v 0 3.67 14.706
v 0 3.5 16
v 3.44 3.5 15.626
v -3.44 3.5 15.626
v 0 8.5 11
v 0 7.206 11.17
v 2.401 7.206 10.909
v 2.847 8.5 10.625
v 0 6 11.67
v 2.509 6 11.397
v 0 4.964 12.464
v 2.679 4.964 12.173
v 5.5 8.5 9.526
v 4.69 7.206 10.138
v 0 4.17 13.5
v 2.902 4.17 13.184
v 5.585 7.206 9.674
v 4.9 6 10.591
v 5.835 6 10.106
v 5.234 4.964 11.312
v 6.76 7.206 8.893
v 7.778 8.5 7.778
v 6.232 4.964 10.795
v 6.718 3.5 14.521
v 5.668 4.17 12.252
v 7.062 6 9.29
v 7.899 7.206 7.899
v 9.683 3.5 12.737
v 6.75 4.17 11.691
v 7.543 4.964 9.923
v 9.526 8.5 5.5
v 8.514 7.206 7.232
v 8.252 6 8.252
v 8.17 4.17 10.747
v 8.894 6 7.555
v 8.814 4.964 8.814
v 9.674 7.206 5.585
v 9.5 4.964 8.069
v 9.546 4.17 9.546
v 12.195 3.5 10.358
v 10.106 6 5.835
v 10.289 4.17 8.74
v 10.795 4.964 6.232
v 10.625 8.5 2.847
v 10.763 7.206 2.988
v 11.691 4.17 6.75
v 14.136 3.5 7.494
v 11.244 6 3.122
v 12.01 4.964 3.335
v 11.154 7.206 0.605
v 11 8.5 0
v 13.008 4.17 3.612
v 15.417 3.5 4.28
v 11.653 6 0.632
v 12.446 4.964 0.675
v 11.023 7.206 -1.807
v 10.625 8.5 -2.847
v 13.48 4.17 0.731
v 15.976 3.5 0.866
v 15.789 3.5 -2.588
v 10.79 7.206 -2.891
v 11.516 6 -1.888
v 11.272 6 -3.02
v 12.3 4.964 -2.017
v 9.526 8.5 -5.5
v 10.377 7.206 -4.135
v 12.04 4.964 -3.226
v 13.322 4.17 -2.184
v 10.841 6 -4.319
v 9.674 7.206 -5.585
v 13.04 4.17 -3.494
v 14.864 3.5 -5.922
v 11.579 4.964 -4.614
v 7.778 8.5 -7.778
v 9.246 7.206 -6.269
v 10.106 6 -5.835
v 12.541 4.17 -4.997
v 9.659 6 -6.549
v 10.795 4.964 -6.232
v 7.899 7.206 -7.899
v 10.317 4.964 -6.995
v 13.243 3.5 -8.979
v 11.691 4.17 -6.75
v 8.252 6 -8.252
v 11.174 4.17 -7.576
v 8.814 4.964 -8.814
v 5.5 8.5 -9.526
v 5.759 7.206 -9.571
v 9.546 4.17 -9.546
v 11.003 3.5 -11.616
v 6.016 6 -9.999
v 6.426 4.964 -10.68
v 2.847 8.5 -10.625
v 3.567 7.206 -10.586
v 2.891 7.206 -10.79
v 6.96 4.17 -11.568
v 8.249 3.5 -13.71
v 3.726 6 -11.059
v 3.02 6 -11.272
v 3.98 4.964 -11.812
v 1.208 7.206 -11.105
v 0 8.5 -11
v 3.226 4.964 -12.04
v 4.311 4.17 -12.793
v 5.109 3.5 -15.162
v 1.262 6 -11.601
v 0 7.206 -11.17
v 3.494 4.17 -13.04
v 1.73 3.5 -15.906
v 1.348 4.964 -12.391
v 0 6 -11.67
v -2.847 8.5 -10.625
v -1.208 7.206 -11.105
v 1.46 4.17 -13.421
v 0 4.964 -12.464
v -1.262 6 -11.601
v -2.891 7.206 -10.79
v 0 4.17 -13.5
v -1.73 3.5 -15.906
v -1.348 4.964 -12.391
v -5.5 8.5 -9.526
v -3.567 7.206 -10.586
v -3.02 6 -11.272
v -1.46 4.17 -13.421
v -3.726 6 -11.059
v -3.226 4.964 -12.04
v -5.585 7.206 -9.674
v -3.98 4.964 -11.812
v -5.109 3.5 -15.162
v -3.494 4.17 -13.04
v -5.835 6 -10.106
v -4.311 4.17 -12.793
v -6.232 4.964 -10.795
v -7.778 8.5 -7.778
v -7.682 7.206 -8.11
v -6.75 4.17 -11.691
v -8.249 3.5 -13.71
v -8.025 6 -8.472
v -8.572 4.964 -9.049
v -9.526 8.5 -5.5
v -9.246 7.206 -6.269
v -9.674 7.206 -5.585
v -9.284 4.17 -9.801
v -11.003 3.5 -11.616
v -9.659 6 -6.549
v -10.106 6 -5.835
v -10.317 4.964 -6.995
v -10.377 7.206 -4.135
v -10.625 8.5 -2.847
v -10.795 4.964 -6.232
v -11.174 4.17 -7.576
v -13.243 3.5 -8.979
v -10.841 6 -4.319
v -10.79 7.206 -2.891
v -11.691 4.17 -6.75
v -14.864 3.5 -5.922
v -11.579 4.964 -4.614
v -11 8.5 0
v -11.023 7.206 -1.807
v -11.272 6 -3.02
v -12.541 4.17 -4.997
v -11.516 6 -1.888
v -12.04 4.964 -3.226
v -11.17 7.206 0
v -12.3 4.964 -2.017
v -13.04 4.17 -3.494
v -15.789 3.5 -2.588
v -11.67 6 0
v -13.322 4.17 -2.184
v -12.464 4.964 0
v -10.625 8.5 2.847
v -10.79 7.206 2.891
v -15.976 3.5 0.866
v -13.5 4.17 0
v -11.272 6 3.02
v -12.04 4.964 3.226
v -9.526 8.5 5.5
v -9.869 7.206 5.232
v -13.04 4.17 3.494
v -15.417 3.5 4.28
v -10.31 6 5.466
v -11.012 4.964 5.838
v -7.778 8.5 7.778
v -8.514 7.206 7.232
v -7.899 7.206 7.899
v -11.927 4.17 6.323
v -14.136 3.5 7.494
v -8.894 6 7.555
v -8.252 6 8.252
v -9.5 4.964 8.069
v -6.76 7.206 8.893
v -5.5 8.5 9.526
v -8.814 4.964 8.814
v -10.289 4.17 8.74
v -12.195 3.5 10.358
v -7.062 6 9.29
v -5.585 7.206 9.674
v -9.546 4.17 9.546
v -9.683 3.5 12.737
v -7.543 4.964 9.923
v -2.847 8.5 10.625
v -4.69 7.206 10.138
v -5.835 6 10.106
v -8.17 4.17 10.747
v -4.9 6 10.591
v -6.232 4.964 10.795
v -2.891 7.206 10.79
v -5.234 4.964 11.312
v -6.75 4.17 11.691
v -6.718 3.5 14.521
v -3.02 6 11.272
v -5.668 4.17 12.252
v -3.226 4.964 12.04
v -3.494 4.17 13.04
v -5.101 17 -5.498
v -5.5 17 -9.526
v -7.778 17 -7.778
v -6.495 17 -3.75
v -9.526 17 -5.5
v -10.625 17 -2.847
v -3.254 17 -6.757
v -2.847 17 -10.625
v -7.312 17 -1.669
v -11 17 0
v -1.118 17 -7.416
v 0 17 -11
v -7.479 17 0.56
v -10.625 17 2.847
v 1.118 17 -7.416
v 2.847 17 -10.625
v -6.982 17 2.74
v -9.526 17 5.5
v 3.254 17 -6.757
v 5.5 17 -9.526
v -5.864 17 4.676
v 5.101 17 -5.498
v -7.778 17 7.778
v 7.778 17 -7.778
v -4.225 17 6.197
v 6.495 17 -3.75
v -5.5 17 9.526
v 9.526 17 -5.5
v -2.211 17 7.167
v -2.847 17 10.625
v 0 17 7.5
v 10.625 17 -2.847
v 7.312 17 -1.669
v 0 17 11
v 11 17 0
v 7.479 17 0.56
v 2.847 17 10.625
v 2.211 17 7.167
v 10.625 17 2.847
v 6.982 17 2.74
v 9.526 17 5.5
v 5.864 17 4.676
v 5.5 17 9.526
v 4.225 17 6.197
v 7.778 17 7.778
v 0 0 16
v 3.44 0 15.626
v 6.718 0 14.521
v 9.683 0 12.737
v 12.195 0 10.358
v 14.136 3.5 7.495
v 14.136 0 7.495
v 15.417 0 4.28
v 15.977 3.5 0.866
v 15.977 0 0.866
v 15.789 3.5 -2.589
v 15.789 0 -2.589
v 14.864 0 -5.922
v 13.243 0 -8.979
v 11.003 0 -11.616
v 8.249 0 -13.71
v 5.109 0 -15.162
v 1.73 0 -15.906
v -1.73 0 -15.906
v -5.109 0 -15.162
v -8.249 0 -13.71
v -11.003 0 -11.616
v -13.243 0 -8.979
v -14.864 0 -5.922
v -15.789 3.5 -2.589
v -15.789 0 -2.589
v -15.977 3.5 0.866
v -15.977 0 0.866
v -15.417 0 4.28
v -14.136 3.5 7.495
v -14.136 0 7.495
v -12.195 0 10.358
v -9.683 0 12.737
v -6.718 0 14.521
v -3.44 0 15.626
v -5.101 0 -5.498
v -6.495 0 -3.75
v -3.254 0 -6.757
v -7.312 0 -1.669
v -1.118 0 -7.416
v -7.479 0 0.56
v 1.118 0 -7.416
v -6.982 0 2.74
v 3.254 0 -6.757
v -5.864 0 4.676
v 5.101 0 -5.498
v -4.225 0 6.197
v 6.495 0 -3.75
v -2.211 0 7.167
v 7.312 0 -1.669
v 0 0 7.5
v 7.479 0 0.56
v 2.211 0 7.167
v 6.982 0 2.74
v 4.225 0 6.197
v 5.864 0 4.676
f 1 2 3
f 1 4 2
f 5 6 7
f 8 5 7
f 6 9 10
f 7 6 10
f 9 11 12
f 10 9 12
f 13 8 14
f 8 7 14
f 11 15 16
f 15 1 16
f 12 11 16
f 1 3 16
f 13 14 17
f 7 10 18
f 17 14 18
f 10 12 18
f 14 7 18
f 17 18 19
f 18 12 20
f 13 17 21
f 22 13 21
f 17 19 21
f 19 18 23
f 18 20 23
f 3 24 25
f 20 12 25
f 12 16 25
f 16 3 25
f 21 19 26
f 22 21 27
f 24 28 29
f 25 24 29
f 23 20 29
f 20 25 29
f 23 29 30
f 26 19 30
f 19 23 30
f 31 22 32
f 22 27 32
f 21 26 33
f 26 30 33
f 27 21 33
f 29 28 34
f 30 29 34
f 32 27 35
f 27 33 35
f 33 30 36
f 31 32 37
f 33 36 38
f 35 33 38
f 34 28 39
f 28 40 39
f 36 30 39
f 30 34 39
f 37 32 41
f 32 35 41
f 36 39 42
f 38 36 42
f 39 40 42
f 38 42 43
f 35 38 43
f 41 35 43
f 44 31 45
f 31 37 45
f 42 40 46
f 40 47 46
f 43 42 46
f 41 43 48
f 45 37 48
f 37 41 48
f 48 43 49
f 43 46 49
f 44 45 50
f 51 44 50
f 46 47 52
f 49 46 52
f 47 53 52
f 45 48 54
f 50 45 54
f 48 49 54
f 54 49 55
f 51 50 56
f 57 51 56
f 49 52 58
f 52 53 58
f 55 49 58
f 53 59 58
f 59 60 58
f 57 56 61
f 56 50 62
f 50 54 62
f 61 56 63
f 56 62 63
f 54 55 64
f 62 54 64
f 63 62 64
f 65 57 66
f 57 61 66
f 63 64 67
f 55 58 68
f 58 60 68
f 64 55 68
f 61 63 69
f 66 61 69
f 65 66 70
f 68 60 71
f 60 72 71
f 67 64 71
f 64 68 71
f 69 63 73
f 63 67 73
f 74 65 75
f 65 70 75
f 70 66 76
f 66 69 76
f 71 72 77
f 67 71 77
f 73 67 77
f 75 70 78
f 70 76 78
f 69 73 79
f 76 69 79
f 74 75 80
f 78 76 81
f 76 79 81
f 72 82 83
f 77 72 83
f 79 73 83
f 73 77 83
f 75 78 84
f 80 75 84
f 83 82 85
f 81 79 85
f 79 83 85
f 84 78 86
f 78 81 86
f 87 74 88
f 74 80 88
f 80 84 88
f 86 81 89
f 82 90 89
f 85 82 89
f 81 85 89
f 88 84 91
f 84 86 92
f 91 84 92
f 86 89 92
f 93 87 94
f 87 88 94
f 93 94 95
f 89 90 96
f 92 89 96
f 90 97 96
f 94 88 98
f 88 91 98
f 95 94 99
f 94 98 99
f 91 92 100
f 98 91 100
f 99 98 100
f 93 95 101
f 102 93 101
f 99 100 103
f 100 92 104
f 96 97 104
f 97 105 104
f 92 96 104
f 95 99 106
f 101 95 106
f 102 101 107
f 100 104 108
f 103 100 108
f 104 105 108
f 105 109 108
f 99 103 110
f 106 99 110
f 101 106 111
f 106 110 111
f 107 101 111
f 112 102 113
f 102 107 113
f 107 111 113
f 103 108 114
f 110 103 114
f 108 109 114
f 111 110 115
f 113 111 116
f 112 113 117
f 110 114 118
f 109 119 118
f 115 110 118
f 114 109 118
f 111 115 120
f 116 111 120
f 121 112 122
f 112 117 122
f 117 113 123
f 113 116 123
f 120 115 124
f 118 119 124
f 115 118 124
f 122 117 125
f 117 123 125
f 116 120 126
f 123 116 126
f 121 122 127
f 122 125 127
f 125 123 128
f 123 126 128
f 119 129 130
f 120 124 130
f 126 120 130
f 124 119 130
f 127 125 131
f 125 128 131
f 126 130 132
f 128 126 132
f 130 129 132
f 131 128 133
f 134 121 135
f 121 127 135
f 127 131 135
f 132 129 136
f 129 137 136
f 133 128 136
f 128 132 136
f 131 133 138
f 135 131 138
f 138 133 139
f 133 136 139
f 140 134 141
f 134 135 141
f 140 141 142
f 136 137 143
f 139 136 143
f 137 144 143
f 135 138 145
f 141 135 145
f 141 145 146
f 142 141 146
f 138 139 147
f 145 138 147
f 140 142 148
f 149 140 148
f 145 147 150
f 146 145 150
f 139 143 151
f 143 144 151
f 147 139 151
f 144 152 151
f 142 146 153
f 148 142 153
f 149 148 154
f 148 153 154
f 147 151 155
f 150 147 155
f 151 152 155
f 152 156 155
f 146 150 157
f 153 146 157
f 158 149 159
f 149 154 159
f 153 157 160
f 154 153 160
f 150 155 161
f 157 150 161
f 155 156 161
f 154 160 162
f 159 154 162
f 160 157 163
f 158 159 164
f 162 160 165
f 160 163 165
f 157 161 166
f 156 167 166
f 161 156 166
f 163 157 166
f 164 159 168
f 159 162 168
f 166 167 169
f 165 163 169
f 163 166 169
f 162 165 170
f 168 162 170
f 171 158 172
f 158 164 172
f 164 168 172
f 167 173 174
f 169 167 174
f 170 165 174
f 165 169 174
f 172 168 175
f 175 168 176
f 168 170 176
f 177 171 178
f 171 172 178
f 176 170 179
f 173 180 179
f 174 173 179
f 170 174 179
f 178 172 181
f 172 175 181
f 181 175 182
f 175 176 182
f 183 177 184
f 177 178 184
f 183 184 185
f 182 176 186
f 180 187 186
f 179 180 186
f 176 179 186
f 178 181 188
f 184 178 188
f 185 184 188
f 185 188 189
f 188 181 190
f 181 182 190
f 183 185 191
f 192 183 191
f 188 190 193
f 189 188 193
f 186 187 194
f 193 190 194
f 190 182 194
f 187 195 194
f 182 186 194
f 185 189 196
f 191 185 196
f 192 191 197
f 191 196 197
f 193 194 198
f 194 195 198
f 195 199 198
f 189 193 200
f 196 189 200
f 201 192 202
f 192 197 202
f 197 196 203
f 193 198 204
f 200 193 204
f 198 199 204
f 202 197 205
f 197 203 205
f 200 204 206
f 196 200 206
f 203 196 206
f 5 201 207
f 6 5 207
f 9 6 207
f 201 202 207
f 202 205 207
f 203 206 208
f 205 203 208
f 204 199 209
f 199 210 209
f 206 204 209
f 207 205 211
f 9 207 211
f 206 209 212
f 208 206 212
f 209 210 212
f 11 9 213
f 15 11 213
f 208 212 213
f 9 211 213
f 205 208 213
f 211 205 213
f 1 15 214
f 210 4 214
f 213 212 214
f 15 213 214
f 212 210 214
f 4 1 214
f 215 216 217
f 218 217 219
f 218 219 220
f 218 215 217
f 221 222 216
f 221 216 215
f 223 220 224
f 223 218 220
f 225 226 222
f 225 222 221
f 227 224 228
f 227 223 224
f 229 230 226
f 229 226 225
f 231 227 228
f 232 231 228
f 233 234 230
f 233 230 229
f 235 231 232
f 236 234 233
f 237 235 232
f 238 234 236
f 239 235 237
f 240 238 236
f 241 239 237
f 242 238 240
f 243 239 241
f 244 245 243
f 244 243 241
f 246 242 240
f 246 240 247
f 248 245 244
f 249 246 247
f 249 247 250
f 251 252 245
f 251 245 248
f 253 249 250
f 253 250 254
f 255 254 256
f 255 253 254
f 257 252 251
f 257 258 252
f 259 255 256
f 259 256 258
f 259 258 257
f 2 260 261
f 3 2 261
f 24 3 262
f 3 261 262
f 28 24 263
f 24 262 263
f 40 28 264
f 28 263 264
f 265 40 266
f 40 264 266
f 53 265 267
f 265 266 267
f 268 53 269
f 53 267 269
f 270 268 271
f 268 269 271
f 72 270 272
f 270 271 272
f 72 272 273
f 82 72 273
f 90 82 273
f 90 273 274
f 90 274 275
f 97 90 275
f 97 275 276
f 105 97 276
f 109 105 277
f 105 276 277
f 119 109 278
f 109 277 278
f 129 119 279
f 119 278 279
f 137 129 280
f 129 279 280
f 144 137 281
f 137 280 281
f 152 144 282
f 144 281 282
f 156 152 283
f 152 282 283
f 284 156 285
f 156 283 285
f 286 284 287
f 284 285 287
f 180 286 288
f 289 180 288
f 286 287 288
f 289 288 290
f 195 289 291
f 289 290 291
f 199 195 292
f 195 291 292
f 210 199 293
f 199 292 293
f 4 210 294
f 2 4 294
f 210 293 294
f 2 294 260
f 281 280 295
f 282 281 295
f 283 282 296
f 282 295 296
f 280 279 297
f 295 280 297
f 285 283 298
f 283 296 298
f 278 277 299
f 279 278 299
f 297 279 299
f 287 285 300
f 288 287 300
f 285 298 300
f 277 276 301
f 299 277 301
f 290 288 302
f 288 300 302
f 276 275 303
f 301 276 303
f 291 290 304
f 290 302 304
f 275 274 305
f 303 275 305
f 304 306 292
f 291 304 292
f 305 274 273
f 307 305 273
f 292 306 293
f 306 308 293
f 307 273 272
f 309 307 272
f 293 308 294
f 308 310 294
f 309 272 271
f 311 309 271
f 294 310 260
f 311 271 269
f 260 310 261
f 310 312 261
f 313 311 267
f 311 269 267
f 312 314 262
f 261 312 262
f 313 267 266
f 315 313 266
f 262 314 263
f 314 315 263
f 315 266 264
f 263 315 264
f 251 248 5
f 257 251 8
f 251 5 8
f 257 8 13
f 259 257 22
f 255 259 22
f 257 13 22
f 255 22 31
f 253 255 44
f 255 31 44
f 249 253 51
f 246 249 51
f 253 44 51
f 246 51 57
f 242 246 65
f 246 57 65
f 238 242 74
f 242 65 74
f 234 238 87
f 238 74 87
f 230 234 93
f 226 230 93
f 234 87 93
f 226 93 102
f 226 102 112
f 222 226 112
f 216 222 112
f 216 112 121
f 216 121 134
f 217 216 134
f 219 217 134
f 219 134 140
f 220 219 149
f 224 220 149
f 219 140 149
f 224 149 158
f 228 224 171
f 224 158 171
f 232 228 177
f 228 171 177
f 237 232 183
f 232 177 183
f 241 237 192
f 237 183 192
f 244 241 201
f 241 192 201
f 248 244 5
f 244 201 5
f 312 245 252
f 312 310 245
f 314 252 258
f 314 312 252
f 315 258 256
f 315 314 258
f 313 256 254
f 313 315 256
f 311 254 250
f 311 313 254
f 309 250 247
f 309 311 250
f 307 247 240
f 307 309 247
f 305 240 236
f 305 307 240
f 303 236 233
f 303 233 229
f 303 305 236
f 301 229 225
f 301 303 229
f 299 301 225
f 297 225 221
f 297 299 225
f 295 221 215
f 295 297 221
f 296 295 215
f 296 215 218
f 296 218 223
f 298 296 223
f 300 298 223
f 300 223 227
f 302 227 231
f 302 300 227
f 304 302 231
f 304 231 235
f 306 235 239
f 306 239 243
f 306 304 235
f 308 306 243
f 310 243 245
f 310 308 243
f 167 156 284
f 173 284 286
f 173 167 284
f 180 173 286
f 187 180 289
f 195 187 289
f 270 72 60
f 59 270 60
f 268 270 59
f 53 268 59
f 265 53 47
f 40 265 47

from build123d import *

# Parameters (mm, degrees)
SKETCH_1_R      = 16
SKETCH_1_R_2    = 7.5
EXTRUDE_1_DEPTH = 3.5
SKETCH_2_R      = 11
SKETCH_2_R_2    = 7.5
EXTRUDE_2_DEPTH = 13.5
FILLET_1_R      = 5


with BuildPart() as part:
    # 草圖1 → 填料-伸長1 (new body)
    with BuildSketch(Plane(origin=(0, 0, 0), x_dir=(1, 0, 0), z_dir=(0, 1, 0))):
        with Locations(Location((0, 0, 0), (0, 0, 270))):
            Circle(SKETCH_1_R)
        with Locations(Location((0, 0, 0), (0, 0, 270))):
            Circle(SKETCH_1_R_2, mode=Mode.SUBTRACT)
    extrude(amount=EXTRUDE_1_DEPTH)

    # 草圖2 → 填料-伸長2 (add)
    with BuildSketch(Plane(origin=(0, 3.5, 0), x_dir=(1, 0, 0), z_dir=(0, 1, 0))):
        with Locations(Location((0, 0, 0), (0, 0, 270))):
            Circle(SKETCH_2_R)
        with Locations(Location((0, 0, 0), (0, 0, 270))):
            Circle(SKETCH_2_R_2, mode=Mode.SUBTRACT)
    extrude(amount=EXTRUDE_2_DEPTH)

    # 圓角1
    fillet_1_edges = [part.edges().sort_by_distance(p)[0] for p in [
        (0, 3.5, -11),
    ]]
    fillet(fillet_1_edges, radius=FILLET_1_R - 0.0001)  # a hair under: the kernel refuses the full size


solid = part.part
